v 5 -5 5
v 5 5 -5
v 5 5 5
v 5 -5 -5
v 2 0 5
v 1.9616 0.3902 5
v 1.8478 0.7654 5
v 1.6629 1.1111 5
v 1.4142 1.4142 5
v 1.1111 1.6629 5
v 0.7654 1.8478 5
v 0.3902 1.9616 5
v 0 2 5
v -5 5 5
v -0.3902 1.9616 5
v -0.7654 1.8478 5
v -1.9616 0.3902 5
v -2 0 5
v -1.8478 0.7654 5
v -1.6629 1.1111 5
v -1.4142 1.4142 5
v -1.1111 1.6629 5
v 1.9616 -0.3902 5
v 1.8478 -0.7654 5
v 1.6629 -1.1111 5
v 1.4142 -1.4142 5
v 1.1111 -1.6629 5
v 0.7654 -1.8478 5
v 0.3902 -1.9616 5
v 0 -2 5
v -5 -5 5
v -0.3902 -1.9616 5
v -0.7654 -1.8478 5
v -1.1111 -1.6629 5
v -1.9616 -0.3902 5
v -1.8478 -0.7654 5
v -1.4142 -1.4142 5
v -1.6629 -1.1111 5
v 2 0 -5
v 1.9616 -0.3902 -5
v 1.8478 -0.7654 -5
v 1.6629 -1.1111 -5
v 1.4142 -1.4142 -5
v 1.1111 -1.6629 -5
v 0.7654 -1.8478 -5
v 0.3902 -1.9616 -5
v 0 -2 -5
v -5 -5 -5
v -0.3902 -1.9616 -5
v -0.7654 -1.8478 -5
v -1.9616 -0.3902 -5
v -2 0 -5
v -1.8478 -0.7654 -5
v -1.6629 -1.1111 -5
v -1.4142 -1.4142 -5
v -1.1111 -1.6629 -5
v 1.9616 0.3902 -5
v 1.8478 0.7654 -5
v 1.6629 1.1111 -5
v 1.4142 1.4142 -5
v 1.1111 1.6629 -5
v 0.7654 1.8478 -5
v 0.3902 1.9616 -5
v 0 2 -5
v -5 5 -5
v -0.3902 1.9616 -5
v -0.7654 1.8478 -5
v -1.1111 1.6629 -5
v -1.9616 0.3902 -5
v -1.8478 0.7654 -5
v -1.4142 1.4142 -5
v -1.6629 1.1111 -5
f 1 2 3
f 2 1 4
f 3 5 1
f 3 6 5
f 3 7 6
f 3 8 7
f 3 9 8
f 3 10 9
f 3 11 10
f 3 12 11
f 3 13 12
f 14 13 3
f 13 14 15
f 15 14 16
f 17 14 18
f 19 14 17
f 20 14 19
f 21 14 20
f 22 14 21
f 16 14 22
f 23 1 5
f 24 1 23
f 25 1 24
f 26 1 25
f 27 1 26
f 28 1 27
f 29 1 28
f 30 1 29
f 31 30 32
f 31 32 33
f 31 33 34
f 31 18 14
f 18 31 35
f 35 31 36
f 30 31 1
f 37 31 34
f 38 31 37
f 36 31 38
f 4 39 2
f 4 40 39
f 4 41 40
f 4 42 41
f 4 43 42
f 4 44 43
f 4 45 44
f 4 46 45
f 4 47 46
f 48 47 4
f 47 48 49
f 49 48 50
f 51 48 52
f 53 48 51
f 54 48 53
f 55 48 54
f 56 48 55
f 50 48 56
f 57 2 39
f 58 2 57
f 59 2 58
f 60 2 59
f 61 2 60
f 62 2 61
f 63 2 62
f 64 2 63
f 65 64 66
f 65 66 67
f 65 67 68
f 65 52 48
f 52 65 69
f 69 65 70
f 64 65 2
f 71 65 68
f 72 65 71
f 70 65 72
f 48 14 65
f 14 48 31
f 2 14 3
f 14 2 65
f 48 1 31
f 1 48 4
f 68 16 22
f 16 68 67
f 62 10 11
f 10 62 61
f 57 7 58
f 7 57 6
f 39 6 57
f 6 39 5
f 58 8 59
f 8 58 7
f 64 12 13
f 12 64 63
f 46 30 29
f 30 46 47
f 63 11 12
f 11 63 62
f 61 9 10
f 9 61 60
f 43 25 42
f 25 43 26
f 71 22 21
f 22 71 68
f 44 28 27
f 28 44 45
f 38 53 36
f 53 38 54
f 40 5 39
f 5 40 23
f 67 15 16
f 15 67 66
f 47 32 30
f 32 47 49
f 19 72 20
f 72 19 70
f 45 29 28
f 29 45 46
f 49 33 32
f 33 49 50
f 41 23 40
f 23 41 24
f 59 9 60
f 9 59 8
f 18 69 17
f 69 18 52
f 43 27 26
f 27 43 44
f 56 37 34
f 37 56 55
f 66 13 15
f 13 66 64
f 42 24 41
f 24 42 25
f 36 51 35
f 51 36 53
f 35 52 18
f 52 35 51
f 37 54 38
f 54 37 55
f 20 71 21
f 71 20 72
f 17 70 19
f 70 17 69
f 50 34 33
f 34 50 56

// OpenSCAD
// Generated by scadwright. Do not hand-edit —
// edit the Python source and regenerate.

$fn = 32;

difference() {
    // _Block
    cube([10, 10, 10], center=true);
    cylinder(h=12, r=2, center=true);
}
